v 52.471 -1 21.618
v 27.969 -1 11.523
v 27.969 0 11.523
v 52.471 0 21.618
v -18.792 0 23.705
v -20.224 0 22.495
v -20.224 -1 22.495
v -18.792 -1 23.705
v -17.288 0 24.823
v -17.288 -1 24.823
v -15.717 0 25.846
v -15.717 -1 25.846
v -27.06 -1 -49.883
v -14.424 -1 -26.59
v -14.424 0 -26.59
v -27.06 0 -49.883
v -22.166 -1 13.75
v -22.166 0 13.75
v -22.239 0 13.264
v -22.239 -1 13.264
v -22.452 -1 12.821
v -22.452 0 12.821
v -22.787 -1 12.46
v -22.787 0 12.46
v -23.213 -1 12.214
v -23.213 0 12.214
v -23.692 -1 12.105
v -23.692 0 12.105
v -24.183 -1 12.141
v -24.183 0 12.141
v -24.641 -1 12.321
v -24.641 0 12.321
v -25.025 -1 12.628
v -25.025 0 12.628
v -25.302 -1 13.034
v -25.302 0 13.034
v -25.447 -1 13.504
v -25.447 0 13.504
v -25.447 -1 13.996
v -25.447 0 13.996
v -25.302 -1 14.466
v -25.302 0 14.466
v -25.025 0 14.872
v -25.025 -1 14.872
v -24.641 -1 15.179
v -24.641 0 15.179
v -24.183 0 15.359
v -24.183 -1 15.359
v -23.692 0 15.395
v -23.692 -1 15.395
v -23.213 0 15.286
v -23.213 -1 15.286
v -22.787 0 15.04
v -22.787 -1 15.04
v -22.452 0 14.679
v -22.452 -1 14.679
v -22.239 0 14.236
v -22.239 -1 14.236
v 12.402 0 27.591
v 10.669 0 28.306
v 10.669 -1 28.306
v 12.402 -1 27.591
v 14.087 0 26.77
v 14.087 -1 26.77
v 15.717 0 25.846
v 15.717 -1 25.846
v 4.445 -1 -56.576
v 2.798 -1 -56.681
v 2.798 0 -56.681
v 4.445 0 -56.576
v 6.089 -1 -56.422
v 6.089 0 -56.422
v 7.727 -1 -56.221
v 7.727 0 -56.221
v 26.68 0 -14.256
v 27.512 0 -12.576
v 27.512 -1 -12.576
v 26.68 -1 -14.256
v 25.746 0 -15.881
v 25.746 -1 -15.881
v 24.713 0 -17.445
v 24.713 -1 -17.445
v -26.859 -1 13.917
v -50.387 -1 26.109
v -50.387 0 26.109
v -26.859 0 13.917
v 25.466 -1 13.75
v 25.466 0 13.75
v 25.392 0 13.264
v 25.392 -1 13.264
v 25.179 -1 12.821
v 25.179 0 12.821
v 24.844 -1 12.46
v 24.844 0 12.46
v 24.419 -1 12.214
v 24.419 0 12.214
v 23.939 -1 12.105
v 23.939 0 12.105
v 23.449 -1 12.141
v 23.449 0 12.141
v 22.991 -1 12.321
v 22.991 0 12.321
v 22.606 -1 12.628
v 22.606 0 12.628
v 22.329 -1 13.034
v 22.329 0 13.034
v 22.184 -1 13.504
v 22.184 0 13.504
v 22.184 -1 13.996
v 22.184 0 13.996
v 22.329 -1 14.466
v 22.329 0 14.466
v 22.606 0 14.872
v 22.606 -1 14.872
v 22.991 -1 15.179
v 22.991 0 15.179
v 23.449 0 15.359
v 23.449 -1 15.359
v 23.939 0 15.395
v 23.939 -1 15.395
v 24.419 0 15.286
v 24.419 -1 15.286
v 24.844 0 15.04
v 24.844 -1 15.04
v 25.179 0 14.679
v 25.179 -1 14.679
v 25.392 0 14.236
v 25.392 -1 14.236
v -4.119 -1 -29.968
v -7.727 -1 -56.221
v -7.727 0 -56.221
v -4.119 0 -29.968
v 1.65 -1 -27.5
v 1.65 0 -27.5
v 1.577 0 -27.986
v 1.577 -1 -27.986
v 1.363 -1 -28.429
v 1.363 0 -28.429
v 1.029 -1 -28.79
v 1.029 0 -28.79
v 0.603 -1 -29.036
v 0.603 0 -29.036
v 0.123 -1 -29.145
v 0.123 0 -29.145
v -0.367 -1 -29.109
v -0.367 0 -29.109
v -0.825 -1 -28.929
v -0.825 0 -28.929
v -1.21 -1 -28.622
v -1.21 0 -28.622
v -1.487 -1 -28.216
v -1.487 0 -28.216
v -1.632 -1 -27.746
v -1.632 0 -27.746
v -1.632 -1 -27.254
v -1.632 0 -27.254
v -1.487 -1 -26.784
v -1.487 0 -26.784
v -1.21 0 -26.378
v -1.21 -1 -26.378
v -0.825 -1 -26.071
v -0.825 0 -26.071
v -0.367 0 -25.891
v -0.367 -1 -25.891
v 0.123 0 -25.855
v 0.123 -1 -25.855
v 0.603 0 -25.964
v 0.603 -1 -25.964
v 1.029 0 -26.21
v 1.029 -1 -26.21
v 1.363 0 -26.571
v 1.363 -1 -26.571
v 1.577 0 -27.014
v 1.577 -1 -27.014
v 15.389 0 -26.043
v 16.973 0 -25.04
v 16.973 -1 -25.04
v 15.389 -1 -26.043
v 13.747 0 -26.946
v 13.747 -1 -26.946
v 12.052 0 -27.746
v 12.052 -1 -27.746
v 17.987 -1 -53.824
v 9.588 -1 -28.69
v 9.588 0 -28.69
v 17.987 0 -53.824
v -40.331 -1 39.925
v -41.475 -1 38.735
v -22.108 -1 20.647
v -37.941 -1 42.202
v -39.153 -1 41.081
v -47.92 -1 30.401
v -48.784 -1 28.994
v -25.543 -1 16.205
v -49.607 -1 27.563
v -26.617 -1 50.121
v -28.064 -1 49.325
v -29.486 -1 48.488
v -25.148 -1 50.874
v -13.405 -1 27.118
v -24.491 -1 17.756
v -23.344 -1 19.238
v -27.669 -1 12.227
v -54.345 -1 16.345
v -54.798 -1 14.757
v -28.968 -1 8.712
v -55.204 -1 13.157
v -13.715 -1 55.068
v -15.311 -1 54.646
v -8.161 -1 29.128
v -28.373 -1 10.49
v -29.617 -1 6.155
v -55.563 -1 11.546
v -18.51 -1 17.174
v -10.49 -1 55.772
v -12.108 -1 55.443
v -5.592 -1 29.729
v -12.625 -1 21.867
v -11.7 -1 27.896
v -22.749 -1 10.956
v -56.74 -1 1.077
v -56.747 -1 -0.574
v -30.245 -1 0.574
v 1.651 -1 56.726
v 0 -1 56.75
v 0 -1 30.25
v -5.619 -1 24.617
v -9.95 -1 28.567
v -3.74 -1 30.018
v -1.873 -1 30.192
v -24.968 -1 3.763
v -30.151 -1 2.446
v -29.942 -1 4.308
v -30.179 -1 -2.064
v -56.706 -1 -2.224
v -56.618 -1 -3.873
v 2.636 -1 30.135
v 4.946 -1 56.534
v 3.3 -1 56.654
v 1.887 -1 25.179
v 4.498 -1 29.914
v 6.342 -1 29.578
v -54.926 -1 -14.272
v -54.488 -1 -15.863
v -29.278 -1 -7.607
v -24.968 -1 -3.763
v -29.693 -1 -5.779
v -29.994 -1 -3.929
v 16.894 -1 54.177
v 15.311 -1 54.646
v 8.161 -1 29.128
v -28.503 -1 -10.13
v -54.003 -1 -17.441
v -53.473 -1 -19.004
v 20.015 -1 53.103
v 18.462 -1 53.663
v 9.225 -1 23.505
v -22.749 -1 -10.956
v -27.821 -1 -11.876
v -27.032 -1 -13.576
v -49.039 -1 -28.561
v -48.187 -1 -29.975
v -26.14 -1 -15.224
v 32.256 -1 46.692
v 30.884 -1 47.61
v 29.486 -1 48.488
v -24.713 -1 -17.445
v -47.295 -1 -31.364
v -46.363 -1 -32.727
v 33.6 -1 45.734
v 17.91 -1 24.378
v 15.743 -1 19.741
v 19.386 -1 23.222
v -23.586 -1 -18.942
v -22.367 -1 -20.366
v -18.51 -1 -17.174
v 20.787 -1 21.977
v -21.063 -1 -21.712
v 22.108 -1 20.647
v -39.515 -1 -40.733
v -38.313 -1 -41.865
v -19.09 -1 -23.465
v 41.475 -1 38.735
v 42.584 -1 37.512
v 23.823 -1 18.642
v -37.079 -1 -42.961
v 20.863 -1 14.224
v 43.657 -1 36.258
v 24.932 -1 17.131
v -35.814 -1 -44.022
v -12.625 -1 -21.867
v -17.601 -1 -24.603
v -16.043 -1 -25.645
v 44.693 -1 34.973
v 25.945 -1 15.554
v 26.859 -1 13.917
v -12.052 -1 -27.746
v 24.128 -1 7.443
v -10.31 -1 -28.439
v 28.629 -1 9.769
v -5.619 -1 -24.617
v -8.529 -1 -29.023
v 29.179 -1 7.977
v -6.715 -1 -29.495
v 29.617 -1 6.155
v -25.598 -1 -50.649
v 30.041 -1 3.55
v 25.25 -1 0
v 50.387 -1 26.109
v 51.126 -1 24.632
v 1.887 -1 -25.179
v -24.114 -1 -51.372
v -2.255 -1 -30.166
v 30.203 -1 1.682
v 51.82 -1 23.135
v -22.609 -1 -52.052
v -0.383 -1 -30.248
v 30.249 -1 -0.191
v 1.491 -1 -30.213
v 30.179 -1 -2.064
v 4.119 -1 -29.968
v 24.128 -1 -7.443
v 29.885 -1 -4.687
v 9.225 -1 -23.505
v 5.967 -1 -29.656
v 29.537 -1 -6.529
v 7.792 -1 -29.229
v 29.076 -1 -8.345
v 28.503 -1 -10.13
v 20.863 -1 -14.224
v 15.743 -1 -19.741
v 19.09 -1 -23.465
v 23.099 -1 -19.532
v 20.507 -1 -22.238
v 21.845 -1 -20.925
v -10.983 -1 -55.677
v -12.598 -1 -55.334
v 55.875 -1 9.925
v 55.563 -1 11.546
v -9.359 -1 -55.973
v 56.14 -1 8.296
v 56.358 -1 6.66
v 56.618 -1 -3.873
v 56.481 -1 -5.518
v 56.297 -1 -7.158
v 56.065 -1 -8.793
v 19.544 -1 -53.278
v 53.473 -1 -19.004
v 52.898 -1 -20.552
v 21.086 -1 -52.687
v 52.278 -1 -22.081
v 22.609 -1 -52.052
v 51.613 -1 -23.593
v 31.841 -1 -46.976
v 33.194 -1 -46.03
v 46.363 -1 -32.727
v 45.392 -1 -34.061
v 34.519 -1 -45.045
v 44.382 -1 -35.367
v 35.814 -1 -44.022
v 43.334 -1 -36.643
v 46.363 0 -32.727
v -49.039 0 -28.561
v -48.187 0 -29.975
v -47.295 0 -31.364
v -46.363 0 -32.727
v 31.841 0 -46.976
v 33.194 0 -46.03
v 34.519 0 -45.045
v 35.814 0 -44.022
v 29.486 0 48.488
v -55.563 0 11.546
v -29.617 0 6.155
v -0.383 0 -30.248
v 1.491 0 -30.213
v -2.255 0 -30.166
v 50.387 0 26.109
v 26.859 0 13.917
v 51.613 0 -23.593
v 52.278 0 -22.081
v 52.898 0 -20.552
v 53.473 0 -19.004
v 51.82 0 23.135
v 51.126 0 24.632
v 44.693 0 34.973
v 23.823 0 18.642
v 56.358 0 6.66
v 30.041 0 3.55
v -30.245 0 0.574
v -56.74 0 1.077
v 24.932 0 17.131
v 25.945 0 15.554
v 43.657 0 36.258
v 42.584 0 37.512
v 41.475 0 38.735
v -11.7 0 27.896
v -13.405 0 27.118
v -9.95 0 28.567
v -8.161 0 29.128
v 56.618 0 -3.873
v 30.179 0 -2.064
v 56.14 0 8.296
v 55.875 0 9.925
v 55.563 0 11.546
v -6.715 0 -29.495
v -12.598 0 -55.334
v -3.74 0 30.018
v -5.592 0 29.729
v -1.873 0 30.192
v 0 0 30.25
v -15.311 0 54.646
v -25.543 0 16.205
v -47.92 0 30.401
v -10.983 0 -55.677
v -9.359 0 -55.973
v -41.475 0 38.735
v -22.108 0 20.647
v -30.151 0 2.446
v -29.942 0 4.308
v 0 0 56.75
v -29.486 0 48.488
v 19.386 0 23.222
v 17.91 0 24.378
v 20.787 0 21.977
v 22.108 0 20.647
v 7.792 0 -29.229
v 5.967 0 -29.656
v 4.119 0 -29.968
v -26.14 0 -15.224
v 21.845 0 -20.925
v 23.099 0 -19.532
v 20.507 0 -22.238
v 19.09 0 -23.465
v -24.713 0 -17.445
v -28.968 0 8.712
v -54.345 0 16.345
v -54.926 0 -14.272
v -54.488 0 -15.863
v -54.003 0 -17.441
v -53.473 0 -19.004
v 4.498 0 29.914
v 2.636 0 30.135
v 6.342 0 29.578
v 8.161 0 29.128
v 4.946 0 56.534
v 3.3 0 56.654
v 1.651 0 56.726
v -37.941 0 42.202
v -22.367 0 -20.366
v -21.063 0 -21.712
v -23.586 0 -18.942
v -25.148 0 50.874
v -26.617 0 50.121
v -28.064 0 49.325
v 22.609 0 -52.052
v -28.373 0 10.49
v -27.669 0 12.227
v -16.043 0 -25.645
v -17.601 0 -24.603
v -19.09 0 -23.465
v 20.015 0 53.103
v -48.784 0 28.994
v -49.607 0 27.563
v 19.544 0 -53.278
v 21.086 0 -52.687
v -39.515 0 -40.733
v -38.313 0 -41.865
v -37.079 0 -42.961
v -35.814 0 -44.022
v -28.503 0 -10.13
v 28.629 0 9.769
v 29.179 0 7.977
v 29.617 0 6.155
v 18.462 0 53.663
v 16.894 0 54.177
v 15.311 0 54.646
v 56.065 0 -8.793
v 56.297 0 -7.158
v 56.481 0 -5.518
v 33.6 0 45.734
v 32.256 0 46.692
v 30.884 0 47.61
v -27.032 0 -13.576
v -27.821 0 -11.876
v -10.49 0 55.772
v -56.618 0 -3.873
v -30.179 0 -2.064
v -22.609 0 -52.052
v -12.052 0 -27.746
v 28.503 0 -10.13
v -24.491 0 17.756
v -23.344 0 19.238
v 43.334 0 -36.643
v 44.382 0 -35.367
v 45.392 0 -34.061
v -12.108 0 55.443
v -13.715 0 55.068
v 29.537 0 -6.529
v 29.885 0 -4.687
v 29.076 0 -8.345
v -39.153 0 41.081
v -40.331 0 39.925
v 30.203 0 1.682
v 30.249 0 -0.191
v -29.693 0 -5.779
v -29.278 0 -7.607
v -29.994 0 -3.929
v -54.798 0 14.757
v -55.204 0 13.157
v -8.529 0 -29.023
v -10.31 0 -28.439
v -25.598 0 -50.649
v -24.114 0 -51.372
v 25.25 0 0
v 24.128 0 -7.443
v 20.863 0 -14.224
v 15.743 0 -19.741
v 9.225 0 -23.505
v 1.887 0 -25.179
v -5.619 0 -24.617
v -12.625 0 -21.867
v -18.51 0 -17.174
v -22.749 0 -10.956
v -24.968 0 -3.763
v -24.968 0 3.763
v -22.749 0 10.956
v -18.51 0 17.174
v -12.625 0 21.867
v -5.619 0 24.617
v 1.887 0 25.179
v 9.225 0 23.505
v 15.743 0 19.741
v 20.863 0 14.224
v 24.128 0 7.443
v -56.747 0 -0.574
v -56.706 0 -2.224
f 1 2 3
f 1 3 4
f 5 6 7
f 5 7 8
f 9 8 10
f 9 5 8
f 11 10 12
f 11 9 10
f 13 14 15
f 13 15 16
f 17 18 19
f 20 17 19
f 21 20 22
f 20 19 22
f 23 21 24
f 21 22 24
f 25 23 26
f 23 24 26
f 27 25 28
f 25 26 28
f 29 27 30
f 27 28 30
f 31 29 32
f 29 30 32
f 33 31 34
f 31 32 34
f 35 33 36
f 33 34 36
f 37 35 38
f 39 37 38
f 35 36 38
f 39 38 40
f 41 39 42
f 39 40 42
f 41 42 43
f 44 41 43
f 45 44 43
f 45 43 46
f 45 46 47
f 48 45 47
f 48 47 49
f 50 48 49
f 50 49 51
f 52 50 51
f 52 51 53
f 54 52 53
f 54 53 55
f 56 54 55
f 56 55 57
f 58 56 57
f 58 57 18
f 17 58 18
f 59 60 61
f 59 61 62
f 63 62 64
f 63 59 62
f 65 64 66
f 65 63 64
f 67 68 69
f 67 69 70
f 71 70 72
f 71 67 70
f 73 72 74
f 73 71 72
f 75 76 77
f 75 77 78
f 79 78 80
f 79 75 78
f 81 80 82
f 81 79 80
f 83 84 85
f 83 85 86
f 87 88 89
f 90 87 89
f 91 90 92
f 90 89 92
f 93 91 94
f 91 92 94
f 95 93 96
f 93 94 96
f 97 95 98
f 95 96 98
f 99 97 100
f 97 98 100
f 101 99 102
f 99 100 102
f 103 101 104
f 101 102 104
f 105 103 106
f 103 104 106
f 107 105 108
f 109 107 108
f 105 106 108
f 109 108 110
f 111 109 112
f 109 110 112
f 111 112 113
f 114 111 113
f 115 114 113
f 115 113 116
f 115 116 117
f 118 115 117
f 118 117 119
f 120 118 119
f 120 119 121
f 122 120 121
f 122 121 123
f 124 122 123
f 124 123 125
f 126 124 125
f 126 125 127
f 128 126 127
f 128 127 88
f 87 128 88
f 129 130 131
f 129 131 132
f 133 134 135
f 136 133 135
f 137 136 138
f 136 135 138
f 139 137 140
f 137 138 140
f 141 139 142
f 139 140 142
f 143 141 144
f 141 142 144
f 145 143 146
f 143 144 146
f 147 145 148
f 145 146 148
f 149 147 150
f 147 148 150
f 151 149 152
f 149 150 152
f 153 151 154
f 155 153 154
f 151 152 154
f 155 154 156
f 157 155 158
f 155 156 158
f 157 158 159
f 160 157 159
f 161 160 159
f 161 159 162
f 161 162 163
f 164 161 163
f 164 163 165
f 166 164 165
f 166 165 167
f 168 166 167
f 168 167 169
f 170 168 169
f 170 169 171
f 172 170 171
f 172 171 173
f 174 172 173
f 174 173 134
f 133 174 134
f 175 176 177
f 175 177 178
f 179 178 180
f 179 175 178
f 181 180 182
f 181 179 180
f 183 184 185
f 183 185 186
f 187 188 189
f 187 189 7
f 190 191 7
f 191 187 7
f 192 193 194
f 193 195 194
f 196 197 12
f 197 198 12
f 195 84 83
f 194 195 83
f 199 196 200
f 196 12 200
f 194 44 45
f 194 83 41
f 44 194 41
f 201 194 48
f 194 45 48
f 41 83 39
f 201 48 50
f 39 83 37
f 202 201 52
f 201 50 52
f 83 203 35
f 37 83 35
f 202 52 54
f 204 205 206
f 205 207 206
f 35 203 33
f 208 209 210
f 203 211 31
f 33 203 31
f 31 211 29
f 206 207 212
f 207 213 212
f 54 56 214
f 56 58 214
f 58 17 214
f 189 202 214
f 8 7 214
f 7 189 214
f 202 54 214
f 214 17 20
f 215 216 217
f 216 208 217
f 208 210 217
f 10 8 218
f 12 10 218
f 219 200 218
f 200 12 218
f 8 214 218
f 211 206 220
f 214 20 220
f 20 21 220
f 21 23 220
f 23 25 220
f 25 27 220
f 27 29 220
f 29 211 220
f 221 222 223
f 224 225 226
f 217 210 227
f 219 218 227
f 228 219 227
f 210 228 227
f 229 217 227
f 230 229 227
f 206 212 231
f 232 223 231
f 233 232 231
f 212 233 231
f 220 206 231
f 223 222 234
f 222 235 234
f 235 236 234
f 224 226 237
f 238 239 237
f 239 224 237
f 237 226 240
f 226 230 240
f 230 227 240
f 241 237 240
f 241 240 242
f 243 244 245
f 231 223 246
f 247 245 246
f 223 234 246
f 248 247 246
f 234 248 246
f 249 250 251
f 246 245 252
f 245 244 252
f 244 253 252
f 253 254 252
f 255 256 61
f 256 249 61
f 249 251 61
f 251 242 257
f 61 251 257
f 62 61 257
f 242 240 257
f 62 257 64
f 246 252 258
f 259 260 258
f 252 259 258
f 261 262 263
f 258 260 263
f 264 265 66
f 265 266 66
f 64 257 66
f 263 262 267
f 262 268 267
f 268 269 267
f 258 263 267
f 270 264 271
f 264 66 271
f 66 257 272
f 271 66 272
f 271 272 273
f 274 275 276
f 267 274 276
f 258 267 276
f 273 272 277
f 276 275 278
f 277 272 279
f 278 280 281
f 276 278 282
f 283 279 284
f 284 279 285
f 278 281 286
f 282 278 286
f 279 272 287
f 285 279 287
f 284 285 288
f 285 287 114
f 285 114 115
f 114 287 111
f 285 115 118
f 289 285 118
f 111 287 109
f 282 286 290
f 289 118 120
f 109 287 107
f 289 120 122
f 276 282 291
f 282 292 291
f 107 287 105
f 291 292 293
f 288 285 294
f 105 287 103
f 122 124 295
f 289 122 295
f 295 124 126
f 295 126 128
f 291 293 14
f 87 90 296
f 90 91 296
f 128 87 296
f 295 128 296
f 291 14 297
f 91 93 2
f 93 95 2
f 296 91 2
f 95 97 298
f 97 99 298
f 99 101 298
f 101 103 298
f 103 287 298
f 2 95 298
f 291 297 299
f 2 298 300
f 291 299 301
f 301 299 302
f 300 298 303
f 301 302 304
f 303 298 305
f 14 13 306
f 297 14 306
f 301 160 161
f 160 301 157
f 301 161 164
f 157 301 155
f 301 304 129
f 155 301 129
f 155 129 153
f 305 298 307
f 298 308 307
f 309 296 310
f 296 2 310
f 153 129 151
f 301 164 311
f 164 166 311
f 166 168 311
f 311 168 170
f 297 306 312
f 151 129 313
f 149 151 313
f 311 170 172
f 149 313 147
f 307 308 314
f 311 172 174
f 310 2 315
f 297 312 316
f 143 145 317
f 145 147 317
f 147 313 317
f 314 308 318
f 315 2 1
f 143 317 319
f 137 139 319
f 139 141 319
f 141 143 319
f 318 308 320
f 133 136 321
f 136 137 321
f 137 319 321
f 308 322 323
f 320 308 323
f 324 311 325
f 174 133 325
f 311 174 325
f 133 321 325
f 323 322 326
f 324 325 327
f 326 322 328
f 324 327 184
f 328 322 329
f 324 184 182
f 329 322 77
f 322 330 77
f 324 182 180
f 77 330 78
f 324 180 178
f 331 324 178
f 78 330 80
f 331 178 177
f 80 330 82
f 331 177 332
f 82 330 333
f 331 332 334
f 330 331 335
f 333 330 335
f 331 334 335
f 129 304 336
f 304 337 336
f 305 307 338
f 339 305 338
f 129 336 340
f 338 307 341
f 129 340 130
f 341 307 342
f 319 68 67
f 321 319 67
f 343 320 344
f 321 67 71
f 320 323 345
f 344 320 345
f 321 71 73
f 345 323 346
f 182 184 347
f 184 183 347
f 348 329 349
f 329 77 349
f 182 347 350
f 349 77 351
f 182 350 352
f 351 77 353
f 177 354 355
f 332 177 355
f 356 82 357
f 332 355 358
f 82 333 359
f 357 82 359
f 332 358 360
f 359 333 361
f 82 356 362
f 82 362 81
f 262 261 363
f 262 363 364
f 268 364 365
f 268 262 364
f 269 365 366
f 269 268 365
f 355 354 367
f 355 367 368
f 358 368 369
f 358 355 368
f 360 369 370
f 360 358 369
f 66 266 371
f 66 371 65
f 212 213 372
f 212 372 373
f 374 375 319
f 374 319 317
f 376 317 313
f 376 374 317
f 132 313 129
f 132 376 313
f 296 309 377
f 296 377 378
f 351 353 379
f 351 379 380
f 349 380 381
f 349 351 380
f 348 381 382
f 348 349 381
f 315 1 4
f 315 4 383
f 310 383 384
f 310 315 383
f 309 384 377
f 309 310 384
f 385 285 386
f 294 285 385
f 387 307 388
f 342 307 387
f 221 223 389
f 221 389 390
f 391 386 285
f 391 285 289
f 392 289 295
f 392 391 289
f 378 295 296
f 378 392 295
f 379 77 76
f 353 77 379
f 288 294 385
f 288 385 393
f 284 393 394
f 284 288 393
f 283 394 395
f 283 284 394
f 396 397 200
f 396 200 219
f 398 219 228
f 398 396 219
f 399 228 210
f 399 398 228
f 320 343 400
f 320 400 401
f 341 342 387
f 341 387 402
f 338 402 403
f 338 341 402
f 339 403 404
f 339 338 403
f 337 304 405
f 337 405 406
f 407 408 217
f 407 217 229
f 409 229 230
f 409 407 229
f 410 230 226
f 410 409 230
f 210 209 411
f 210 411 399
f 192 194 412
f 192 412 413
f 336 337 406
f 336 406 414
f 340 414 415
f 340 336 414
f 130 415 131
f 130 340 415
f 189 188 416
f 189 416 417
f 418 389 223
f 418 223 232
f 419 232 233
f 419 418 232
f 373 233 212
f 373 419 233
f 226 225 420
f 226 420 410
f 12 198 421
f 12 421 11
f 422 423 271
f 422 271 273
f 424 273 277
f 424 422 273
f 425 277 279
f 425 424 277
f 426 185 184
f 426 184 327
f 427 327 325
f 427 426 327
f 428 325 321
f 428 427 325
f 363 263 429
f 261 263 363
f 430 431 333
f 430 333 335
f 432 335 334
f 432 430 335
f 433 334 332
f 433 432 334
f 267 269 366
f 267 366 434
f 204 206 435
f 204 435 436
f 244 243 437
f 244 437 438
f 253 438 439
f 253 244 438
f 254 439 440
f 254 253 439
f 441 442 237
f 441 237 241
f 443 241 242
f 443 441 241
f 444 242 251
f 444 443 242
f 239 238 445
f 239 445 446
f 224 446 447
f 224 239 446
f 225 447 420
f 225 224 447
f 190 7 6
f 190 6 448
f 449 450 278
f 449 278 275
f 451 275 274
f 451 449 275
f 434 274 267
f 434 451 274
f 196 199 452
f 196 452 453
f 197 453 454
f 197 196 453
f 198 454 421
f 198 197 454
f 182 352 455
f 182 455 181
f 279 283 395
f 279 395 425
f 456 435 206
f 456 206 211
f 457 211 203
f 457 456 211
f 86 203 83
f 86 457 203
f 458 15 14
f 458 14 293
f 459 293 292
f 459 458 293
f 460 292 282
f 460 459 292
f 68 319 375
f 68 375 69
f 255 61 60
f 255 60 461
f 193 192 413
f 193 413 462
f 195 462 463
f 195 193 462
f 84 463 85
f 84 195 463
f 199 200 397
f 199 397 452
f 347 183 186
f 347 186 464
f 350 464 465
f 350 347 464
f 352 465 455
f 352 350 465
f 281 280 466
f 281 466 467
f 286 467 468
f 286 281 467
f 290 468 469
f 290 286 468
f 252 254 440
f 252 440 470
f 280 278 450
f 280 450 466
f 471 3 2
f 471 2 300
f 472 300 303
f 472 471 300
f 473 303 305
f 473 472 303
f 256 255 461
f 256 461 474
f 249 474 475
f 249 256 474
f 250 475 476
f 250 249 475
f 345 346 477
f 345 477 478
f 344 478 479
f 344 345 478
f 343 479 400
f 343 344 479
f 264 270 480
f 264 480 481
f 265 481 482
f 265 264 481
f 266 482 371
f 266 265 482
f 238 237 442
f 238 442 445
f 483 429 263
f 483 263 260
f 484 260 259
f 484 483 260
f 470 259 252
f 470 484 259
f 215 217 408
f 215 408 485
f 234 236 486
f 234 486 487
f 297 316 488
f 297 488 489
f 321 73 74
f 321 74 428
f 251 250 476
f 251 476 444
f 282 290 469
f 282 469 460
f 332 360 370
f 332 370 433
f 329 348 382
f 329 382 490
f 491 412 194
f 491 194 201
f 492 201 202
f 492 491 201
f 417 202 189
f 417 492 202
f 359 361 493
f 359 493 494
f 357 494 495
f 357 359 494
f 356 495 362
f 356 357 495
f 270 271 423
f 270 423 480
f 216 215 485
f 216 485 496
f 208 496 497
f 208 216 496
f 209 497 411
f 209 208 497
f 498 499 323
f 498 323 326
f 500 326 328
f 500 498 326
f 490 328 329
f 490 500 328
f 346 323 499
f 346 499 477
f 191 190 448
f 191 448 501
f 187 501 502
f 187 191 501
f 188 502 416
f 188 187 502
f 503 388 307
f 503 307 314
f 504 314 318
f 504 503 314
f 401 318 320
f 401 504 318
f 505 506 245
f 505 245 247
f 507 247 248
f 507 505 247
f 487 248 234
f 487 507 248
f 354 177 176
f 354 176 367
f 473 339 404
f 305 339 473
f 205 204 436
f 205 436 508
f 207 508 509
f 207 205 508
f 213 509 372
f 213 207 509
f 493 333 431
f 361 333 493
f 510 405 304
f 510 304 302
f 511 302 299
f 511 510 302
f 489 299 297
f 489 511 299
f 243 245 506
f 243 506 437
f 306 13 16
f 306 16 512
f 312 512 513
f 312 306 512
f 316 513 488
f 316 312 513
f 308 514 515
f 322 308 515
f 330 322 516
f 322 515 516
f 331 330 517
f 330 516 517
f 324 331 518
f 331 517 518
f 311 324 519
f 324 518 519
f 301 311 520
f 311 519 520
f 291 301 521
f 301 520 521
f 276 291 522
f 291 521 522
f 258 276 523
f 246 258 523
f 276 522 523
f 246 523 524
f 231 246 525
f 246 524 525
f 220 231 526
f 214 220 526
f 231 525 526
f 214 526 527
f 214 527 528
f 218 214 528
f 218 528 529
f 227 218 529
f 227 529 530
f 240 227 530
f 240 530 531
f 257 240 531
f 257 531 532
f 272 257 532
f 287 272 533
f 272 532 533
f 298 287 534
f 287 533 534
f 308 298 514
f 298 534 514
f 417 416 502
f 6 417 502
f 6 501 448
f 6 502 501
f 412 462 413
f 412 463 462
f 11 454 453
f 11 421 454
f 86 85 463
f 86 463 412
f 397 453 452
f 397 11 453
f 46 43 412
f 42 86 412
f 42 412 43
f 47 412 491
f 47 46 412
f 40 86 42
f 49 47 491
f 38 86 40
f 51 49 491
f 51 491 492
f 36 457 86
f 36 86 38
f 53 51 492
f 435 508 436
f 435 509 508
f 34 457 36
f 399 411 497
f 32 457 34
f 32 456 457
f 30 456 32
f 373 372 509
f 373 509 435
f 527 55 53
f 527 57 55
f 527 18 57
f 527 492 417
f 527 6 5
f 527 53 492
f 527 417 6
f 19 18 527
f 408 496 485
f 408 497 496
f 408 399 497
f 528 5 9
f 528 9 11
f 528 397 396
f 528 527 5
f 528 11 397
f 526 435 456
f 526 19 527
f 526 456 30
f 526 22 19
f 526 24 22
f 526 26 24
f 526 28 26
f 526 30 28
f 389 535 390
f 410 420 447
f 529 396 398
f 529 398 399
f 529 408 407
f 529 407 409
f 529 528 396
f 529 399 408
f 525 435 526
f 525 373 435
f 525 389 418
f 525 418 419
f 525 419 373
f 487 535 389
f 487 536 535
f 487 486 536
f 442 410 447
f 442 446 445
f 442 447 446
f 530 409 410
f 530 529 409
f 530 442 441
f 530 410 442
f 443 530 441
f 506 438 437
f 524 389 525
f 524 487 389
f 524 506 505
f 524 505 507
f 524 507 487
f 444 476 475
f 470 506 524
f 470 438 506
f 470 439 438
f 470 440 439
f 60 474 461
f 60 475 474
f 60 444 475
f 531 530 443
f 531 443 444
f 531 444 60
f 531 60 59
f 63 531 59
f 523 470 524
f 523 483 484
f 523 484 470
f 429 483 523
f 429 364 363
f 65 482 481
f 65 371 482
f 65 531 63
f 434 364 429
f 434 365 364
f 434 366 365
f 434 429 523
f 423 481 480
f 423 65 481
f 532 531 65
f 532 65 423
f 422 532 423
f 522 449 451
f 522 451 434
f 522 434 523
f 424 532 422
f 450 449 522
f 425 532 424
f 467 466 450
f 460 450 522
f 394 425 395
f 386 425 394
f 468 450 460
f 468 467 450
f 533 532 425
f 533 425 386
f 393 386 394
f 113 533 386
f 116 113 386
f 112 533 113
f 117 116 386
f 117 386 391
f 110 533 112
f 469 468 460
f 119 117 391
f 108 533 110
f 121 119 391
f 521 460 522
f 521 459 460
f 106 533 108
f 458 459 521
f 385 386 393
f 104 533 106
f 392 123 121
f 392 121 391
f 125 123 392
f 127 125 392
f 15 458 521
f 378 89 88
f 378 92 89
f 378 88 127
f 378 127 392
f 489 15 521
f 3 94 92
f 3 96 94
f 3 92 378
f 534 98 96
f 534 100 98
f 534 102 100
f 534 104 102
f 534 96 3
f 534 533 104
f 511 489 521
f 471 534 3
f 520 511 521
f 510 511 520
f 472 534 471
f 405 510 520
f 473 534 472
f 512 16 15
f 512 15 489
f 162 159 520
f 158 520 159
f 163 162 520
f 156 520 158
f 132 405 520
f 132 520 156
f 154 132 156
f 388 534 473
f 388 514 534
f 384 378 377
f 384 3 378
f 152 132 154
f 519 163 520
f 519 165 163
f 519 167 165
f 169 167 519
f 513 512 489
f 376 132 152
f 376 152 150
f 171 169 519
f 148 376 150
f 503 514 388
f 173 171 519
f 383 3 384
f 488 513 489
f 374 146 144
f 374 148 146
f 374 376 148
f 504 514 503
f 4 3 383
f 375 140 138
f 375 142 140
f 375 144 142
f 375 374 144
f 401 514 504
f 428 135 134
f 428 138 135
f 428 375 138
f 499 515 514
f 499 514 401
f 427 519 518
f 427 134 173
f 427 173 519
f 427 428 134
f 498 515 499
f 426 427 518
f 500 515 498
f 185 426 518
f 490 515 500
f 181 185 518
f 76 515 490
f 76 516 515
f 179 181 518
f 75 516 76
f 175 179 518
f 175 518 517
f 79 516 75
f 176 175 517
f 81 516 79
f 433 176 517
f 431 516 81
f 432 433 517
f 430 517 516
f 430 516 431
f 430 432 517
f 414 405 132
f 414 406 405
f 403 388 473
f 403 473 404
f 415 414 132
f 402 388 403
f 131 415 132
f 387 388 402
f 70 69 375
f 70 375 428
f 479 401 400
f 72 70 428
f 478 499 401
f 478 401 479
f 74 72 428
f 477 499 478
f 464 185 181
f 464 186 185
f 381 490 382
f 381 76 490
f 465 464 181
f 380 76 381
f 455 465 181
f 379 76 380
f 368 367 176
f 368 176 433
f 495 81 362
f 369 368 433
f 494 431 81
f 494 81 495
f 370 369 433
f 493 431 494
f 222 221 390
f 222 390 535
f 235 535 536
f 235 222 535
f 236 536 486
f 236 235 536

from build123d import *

# Parameters (mm, degrees)
SKETCH1_R           = 30.25
SKETCH1_R_2         = 25.25
EXTRUDE_THIN1_DEPTH = 1
SKETCH2_R           = 1.65
CUT_EXTRUDE3_DEPTH  = 10
BOSS_EXTRUDE1_DEPTH = 1


with BuildPart() as part:
    # Sketch1 → Extrude-Thin1 (new body)
    with BuildSketch(Plane(origin=(0, 0, 0), x_dir=(1, 0, 0), z_dir=(0, 1, 0))):
        Circle(SKETCH1_R)
        Circle(SKETCH1_R_2, mode=Mode.SUBTRACT)
    extrude(amount=-EXTRUDE_THIN1_DEPTH)

    # Sketch2 → Cut-Extrude3 (cut)
    with BuildSketch(Plane(origin=(0, 0, 0), x_dir=(1, 0, 0), z_dir=(0, 1, 0))):
        with Locations((0, 27.5)):
            Circle(SKETCH2_R)
        with Locations((23.815698604, -13.75)):
            Circle(SKETCH2_R)
        with Locations((-23.815698604, -13.75)):
            Circle(SKETCH2_R)
    extrude(amount=-CUT_EXTRUDE3_DEPTH, mode=Mode.SUBTRACT)

    # Sketch5 → Boss-Extrude1 (add)
    with BuildSketch(Plane.XZ.offset(1)):
        with BuildLine():
            Line((0, 56.75), (0, 30.25))
            ThreePointArc((0, 30.25), (1.319486468, 30.221208703), (2.636461218, 30.134889617))
            Line((2.636461218, 30.134889617), (4.946088401, 56.534049117))
            ThreePointArc((4.946088401, 56.534049117), (2.475400233, 56.695986575), (0, 56.75))
        make_face()
        with BuildLine():
            Line((15.310966763, 54.645556057), (8.161352328, 29.128247942))
            ThreePointArc((8.161352328, 29.128247942), (9.424140859, 28.744531116), (10.668990002, 28.306097441))
            Line((10.668990002, 28.306097441), (20.015377938, 53.103174538))
            ThreePointArc((20.015377938, 53.103174538), (17.679999793, 53.925690606), (15.310966763, 54.645556057))
        make_face()
        with BuildLine():
            Line((29.486389165, 48.488301208), (15.717414489, 25.846186988))
            ThreePointArc((15.717414489, 25.846186988), (16.829849835, 25.136003154), (17.910248605, 24.377971509))
            Line((17.910248605, 24.377971509), (33.600218458, 45.733880434))
            ThreePointArc((33.600218458, 45.733880434), (31.573354649, 47.155972858), (29.486389165, 48.488301208))
        make_face()
        with BuildLine():
            Line((41.474940973, 38.734890878), (22.107787919, 20.647232582))
            ThreePointArc((22.107787919, 20.647232582), (22.98736584, 19.663252827), (23.823186003, 18.641842952))
            Line((23.823186003, 18.641842952), (44.693084485, 34.972713638))
            ThreePointArc((44.693084485, 34.972713638), (43.125058229, 36.888912328), (41.474940973, 38.734890878))
        make_face()
        with BuildLine():
            Line((50.387486144, 26.108690891), (26.858527857, 13.916967391))
            ThreePointArc((26.858527857, 13.916967391), (27.440014081, 12.732168992), (27.969266679, 11.523134184))
            Line((27.969266679, 11.523134184), (52.471268894, 21.61778066))
            ThreePointArc((52.471268894, 21.61778066), (51.478373524, 23.885969926), (50.387486144, 26.108690891))
        make_face()
        with BuildLine():
            Line((55.563021976, 11.546128741), (29.617293652, 6.154544395))
            ThreePointArc((29.617293652, 6.154544395), (29.857562008, 4.856798428), (30.040994796, 3.549807269))
            Line((30.040994796, 3.549807269), (56.357899329, 6.659555785))
            ThreePointArc((56.357899329, 6.659555785), (56.013773353, 9.111514406), (55.563021976, 11.546128741))
        make_face()
        with BuildLine():
            Line((56.617702652, -3.872756958), (30.179480268, -2.064333004))
            ThreePointArc((30.179480268, -2.064333004), (30.060711149, -3.378778657), (29.884719758, -4.686792612))
            Line((29.884719758, -4.686792612), (56.06472219, -8.792577876))
            ThreePointArc((56.06472219, -8.792577876), (56.394887858, -6.338700456), (56.617702652, -3.872756958))
        make_face()
        with BuildLine():
            Line((53.47330733, -19.004417991), (28.503392894, -10.130108268))
            ThreePointArc((28.503392894, -10.130108268), (28.034394863, -11.363767186), (27.512031768, -12.575794526))
            Line((27.512031768, -12.575794526), (51.613481086, -23.59260626))
            ThreePointArc((51.613481086, -23.59260626), (52.59345152, -21.318802902), (53.47330733, -19.004417991))
        make_face()
        with BuildLine():
            Line((46.363041428, -32.72660828), (24.713339264, -17.444579744))
            ThreePointArc((24.713339264, -17.444579744), (23.928895759, -18.505957088), (23.098902242, -19.532107291))
            Line((23.098902242, -19.532107291), (43.334304206, -36.642878967))
            ThreePointArc((43.334304206, -36.642878967), (44.891399482, -34.717787264), (46.363041428, -32.72660828))
        make_face()
        with BuildLine():
            Line((35.814240841, -44.021615747), (19.090410316, -23.465266544))
            ThreePointArc((19.090410316, -23.465266544), (18.048699924, -24.275644812), (16.972632807, -25.039813011))
            Line((16.972632807, -25.039813011), (31.841220224, -46.97551697))
            ThreePointArc((31.841220224, -46.97551697), (33.859957709, -45.541912168), (35.814240841, -44.021615747))
        make_face()
        with BuildLine():
            Line((22.609261849, -52.05174136), (12.051632968, -27.745641871))
            ThreePointArc((12.051632968, -27.745641871), (10.829914583, -28.244919014), (9.587580841, -28.690430349))
            Line((9.587580841, -28.690430349), (17.986618602, -53.824195779))
            ThreePointArc((17.986618602, -53.824195779), (20.317277772, -52.988401787), (22.609261849, -52.05174136))
        make_face()
        with BuildLine():
            Line((7.727457336, -56.221427438), (4.119041135, -29.968249868))
            ThreePointArc((4.119041135, -29.968249868), (2.807924021, -30.119396785), (1.491461864, -30.213209719))
            Line((1.491461864, -30.213209719), (2.798031761, -56.680980216))
            ThreePointArc((2.798031761, -56.680980216), (5.267758287, -56.504984051), (7.727457336, -56.221427438))
        make_face()
        with BuildLine():
            Line((-7.727457336, -56.221427438), (-4.119041135, -29.968249868))
            ThreePointArc((-4.119041135, -29.968249868), (-5.42231742, -29.760056683), (-6.715272016, -29.49521354))
            Line((-6.715272016, -29.49521354), (-12.598072295, -55.333995649))
            ThreePointArc((-12.598072295, -55.333995649), (-10.172446731, -55.830850141), (-7.727457336, -56.221427438))
        make_face()
        with BuildLine():
            Line((-22.609261849, -52.05174136), (-12.051632968, -27.745641871))
            ThreePointArc((-12.051632968, -27.745641871), (-13.250410384, -27.193549321), (-14.423964891, -26.589692304))
            Line((-14.423964891, -26.589692304), (-27.059834961, -49.88314176))
            ThreePointArc((-27.059834961, -49.88314176), (-24.858207911, -51.015997486), (-22.609261849, -52.05174136))
        make_face()
        with BuildLine():
            Line((-35.814240841, -44.021615747), (-19.090410316, -23.465266544))
            ThreePointArc((-19.090410316, -23.465266544), (-20.095781026, -22.610220807), (-21.062898275, -21.71213523))
            Line((-21.062898275, -21.71213523), (-39.514693459, -40.732683448))
            ThreePointArc((-39.514693459, -40.732683448), (-37.700349529, -42.417521679), (-35.814240841, -44.021615747))
        make_face()
        with BuildLine():
            Line((-46.363041428, -32.72660828), (-24.713339264, -17.444579744))
            ThreePointArc((-24.713339264, -17.444579744), (-25.450739522, -16.349995651), (-26.139692851, -15.224288412))
            Line((-26.139692851, -15.224288412), (-49.038927911, -28.561268343))
            ThreePointArc((-49.038927911, -28.561268343), (-47.74642869, -30.673132337), (-46.363041428, -32.72660828))
        make_face()
        with BuildLine():
            Line((-53.47330733, -19.004417991), (-28.503392894, -10.130108268))
            ThreePointArc((-28.503392894, -10.130108268), (-28.918133096, -8.877166114), (-29.277825989, -7.607325769))
            Line((-29.277825989, -7.607325769), (-54.926169417, -14.271594625))
            ThreePointArc((-54.926169417, -14.271594625), (-54.25137366, -16.65385709), (-53.47330733, -19.004417991))
        make_face()
        with BuildLine():
            Line((-56.617702652, -3.872756958), (-30.179480268, -2.064333004))
            ThreePointArc((-30.179480268, -2.064333004), (-30.240801031, -0.745957776), (-30.24455671, 0.573837425))
            Line((-30.24455671, 0.573837425), (-56.739788209, 1.076537978))
            ThreePointArc((-56.739788209, 1.076537978), (-56.73274243, -1.399441448), (-56.617702652, -3.872756958))
        make_face()
        with BuildLine():
            Line((-55.563021976, 11.546128741), (-29.617293652, 6.154544395))
            ThreePointArc((-29.617293652, 6.154544395), (-29.320647095, 7.440574837), (-28.96818702, 8.712441722))
            Line((-28.96818702, 8.712441722), (-54.345276476, 16.344828685))
            ThreePointArc((-54.345276476, 16.344828685), (-55.006503229, 13.958764363), (-55.563021976, 11.546128741))
        make_face()
        with BuildLine():
            Line((-50.387486144, 26.108690891), (-26.858527857, 13.916967391))
            ThreePointArc((-26.858527857, 13.916967391), (-26.225914898, 15.075274053), (-25.54337942, 16.204884073))
            Line((-25.54337942, 16.204884073), (-47.9202242, 30.40089822))
            ThreePointArc((-47.9202242, 30.40089822), (-49.200683321, 28.281712479), (-50.387486144, 26.108690891))
        make_face()
        with BuildLine():
            Line((-41.474940973, 38.734890878), (-22.107787919, 20.647232582))
            ThreePointArc((-22.107787919, 20.647232582), (-21.186126568, 21.591909157), (-20.22413622, 22.495484305))
            Line((-20.22413622, 22.495484305), (-37.941148116, 42.202272209))
            ThreePointArc((-37.941148116, 42.202272209), (-39.745873809, 40.507135361), (-41.474940973, 38.734890878))
        make_face()
        with BuildLine():
            Line((-29.486389165, 48.488301208), (-15.717414489, 25.846186988))
            ThreePointArc((-15.717414489, 25.846186988), (-14.575060151, 26.507171136), (-13.404961357, 27.117697377))
            Line((-13.404961357, 27.117697377), (-25.148150645, 50.873696731))
            ThreePointArc((-25.148150645, 50.873696731), (-27.343294663, 49.72832932), (-29.486389165, 48.488301208))
        make_face()
        with BuildLine():
            Line((-15.310966763, 54.645556057), (-8.161352327, 29.128247942))
            ThreePointArc((-8.161352327, 29.128247942), (-6.883028198, 29.456517493), (-5.591601834, 29.728714889))
            Line((-5.591601834, 29.728714889), (-10.490029886, 55.772051899))
            ThreePointArc((-10.490029886, 55.772051899), (-12.912788438, 55.261400586), (-15.310966763, 54.645556057))
        make_face()
    extrude(amount=-BOSS_EXTRUDE1_DEPTH)


solid = part.part
